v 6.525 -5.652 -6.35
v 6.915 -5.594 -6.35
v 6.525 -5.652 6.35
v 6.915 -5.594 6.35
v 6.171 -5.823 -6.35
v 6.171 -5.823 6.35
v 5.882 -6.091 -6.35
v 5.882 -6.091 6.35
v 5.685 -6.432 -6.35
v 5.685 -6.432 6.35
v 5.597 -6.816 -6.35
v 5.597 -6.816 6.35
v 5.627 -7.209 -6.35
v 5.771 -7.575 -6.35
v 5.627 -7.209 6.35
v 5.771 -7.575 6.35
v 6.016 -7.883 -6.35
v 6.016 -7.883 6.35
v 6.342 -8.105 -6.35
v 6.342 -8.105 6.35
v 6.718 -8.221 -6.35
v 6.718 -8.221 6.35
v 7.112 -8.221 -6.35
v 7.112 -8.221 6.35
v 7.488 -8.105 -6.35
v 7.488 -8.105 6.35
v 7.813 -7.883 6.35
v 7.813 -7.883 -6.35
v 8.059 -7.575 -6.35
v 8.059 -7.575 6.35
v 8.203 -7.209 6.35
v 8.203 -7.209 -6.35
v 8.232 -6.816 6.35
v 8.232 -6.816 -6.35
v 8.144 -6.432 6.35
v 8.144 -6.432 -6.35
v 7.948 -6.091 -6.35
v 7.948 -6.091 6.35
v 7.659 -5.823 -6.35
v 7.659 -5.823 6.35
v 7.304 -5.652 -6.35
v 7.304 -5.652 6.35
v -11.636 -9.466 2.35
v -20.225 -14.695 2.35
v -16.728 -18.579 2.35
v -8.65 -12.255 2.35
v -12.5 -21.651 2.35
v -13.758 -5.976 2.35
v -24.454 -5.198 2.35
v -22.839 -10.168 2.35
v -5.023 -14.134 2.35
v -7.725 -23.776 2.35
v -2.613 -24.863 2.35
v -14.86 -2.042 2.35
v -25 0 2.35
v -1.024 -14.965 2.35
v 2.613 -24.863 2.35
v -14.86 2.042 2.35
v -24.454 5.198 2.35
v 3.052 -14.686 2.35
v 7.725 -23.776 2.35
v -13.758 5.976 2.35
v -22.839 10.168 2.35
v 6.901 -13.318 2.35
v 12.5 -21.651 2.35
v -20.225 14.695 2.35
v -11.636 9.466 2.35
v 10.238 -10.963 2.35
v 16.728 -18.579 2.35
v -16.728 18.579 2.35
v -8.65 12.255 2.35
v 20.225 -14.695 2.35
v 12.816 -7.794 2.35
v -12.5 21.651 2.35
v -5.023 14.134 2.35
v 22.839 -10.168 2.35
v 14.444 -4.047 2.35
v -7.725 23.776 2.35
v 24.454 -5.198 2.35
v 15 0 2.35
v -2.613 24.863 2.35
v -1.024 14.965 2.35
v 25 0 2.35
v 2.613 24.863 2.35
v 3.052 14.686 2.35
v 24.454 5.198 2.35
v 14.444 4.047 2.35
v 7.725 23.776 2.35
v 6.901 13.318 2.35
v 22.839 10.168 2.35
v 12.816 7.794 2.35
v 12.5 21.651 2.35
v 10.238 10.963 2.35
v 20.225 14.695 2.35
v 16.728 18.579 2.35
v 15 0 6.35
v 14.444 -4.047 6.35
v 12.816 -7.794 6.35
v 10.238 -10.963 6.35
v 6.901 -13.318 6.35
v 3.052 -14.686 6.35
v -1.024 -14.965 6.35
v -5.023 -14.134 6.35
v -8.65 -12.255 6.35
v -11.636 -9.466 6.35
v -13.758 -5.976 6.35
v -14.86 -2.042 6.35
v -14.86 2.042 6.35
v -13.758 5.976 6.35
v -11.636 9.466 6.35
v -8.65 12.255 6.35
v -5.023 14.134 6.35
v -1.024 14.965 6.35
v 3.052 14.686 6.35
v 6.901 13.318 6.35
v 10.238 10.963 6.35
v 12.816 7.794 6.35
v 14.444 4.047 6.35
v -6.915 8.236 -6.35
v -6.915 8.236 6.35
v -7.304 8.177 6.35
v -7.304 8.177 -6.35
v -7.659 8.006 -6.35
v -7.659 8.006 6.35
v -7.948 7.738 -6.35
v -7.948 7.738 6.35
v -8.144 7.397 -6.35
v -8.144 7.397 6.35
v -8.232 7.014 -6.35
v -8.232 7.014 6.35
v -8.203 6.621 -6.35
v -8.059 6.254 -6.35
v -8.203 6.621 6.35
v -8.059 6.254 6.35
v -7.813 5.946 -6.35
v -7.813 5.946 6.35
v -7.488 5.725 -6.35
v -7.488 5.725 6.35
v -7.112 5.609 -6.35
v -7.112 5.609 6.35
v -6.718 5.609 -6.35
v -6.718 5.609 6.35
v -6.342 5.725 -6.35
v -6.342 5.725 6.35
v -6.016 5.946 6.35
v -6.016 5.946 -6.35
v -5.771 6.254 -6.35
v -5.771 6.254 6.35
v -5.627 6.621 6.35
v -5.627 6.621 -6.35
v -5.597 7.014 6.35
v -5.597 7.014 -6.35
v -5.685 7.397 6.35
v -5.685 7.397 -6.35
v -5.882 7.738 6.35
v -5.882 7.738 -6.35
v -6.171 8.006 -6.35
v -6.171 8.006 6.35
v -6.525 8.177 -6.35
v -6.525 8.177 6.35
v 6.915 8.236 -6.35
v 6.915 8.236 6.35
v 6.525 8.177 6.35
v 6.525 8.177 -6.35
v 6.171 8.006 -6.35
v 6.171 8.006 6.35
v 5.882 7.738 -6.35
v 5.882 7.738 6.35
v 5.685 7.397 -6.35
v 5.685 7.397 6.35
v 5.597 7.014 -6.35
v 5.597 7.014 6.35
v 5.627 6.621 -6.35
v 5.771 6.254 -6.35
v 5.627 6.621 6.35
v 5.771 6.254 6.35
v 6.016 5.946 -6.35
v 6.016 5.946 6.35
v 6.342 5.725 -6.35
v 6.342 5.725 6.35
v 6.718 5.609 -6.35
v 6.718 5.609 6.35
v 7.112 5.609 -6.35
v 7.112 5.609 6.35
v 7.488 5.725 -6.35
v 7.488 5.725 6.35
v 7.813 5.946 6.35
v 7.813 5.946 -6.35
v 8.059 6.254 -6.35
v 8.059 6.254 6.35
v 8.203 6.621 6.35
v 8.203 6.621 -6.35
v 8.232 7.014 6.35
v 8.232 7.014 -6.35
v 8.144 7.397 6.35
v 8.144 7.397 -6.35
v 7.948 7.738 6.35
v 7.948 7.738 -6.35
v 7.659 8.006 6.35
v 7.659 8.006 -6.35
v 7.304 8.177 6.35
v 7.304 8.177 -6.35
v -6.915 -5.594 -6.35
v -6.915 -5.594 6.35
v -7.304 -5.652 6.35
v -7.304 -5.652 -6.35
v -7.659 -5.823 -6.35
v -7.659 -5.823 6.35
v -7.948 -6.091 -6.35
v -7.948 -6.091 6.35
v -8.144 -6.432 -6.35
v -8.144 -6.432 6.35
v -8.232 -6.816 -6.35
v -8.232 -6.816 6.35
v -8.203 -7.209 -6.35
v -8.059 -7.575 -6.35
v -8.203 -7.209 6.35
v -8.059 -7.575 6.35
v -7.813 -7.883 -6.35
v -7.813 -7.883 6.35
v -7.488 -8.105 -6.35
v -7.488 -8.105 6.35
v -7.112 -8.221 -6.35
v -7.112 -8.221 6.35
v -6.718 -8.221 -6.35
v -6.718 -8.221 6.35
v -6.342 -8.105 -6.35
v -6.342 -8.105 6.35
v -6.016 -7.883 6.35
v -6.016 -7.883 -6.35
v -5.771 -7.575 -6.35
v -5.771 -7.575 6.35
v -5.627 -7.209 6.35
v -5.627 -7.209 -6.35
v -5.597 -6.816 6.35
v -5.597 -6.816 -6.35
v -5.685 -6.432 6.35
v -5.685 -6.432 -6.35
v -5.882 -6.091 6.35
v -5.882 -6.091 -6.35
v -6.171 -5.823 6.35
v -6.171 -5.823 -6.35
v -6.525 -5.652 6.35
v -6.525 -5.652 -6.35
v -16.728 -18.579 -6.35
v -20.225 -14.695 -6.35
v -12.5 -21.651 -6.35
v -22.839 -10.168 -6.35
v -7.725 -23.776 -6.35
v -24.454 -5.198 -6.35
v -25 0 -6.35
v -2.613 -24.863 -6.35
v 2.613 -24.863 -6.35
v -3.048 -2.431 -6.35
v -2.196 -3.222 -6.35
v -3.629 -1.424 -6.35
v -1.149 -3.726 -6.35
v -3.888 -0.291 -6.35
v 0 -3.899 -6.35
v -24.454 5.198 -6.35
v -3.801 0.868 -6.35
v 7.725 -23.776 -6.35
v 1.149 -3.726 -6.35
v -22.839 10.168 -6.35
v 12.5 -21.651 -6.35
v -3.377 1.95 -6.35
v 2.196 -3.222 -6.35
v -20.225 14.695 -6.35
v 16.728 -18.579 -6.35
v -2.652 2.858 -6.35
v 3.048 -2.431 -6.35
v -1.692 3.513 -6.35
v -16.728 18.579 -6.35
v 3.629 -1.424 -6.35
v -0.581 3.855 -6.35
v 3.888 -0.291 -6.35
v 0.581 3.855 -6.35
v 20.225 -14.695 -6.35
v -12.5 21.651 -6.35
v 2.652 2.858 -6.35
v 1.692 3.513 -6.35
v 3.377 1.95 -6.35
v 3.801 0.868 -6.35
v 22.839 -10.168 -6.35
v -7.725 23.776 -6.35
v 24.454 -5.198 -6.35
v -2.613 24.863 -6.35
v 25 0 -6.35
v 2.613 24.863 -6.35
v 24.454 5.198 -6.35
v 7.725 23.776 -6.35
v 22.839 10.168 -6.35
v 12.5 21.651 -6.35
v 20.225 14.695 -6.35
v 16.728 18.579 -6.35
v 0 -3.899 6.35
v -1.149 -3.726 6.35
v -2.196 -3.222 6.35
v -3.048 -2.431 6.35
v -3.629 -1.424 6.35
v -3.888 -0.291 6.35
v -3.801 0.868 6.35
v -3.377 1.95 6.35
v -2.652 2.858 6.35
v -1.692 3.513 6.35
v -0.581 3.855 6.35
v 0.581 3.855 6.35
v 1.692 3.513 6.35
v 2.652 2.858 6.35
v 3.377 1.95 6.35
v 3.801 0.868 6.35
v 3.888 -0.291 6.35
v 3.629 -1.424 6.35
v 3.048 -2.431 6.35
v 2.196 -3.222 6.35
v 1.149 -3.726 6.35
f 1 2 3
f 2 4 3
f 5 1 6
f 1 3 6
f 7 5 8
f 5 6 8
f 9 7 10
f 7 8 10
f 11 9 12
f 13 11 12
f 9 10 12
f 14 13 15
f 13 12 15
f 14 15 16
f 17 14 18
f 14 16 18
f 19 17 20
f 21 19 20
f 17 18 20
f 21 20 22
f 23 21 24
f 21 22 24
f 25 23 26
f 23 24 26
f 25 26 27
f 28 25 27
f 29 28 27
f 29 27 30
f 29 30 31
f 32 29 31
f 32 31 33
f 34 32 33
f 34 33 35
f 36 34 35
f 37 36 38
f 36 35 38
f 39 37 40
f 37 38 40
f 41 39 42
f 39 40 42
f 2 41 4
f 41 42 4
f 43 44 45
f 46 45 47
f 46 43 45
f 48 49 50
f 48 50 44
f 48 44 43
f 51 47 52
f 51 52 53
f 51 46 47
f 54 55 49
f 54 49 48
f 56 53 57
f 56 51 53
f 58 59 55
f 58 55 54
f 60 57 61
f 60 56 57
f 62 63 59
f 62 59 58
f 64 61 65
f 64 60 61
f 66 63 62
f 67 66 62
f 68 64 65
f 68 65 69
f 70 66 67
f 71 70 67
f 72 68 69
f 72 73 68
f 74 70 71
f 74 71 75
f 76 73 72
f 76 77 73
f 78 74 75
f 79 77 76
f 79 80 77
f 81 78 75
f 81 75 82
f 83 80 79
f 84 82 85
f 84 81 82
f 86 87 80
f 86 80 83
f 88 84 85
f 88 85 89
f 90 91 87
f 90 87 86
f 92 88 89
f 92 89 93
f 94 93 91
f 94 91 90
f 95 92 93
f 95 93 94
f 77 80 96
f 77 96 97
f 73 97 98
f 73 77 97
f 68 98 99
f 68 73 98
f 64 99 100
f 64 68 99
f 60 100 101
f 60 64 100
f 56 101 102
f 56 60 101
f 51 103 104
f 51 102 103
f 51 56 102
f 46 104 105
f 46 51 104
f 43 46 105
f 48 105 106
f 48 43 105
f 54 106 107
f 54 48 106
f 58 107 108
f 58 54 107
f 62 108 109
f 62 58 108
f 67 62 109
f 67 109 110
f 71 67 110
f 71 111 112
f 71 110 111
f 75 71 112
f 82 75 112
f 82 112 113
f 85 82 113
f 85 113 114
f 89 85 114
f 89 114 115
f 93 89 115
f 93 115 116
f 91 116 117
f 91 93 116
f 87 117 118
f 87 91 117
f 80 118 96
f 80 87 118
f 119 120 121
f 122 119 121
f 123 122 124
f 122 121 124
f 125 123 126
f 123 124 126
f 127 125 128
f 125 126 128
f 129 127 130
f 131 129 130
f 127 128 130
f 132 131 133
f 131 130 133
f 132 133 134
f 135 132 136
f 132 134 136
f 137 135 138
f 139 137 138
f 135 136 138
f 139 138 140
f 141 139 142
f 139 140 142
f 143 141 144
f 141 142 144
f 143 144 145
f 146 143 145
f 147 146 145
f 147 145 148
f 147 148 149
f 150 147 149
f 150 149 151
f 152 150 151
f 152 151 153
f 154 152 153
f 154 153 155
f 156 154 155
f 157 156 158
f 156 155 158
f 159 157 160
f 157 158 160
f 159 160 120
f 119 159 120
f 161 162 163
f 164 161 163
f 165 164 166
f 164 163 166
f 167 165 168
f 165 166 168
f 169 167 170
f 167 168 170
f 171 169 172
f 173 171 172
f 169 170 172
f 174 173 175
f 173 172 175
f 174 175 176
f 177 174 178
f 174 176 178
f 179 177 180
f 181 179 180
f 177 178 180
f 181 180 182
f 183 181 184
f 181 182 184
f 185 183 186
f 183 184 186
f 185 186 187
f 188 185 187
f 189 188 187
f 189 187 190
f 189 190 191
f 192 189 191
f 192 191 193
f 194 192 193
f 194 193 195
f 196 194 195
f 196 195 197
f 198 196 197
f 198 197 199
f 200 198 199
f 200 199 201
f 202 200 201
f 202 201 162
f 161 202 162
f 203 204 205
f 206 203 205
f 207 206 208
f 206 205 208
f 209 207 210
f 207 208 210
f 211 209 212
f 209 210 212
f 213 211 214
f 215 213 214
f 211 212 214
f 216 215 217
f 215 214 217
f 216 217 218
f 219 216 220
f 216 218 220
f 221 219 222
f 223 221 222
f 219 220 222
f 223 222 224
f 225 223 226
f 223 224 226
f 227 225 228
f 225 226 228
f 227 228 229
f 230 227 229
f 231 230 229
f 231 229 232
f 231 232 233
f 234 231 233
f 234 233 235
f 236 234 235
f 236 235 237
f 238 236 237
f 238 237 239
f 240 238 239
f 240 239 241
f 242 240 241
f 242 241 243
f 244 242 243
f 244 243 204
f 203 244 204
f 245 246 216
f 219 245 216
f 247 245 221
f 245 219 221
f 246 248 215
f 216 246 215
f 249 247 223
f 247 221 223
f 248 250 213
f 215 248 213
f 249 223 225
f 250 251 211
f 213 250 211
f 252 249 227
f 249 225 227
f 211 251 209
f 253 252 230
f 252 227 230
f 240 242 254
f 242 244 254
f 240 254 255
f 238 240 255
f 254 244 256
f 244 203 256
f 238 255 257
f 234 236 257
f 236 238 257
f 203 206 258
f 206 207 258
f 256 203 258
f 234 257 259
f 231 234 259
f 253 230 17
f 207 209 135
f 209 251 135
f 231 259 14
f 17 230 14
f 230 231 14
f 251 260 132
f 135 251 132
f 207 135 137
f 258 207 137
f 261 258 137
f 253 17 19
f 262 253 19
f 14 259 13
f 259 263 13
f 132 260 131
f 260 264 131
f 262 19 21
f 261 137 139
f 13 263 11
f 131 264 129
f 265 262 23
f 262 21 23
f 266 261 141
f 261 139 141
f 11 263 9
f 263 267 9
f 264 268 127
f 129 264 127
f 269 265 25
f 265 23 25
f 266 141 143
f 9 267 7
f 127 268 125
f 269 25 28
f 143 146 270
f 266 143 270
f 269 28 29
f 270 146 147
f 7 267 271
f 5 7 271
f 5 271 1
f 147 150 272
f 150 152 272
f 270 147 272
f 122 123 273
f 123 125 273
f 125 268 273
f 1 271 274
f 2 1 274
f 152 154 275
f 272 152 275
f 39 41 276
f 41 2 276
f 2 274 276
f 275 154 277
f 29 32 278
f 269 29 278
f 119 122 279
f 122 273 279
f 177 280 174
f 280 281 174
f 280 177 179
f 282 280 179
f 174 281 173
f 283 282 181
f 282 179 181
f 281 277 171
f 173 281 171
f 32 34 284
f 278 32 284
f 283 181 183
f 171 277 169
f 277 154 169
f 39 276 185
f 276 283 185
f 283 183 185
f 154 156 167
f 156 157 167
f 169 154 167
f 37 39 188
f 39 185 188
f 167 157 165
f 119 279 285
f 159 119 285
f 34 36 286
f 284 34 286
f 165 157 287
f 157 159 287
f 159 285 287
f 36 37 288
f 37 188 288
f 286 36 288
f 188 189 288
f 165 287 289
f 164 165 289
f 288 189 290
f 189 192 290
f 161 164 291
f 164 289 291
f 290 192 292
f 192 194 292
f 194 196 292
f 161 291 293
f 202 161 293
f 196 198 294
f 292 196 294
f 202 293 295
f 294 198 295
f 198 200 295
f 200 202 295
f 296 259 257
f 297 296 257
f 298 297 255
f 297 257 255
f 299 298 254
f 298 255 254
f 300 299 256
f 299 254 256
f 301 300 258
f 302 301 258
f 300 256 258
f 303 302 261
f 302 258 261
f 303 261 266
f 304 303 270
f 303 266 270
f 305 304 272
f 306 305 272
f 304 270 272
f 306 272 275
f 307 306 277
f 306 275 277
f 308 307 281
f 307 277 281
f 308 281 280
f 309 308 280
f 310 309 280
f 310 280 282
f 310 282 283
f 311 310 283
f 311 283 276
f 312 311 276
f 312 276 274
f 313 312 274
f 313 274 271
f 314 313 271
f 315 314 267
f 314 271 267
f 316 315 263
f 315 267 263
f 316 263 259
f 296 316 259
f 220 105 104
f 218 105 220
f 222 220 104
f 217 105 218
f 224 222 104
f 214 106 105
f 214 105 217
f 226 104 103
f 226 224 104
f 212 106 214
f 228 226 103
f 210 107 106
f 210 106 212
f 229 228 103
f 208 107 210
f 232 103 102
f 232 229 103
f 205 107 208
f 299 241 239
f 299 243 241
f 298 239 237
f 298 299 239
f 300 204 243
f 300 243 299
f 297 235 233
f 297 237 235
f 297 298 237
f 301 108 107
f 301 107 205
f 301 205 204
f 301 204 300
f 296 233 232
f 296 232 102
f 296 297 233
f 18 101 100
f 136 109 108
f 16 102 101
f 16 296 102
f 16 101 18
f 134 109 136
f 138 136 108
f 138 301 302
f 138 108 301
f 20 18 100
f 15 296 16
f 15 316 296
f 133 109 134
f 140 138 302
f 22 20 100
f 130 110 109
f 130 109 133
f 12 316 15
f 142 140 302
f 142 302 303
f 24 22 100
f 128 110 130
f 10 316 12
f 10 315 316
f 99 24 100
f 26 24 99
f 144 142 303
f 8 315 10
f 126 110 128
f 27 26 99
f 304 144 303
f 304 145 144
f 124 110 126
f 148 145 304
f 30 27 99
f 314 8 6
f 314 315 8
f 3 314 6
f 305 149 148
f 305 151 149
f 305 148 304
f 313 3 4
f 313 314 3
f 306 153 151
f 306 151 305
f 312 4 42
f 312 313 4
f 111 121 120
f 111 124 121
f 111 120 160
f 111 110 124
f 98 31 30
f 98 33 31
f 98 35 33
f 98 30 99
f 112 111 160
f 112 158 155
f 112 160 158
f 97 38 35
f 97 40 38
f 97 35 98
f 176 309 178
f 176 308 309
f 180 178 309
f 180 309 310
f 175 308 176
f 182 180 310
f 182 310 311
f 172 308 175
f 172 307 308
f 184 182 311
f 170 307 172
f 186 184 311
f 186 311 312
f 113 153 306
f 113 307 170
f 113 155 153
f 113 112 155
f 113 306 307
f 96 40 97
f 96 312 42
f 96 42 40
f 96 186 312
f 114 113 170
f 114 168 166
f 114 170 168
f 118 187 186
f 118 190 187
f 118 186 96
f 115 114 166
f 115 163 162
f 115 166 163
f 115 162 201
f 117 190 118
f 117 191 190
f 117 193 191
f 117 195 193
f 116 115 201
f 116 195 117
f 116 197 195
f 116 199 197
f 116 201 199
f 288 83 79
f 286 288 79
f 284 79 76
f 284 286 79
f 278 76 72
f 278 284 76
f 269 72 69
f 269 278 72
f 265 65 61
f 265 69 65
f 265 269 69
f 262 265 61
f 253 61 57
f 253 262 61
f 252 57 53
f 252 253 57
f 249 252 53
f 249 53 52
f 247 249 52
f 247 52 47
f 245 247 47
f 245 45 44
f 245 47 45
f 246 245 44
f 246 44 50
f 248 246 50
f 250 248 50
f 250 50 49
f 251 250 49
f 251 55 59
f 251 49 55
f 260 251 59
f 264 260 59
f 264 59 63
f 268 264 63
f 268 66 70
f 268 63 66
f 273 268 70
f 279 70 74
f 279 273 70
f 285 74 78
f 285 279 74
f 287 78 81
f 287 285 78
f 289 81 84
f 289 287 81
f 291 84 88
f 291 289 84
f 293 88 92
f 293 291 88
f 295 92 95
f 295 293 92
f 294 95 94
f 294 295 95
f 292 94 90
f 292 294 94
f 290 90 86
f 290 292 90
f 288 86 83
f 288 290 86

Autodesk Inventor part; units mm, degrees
ref_plane "YZ Plane" through (0, 0, 0) normal (1, 0, 0) x (0, 1, 0)
ref_plane "XZ Plane" through (0, 0, 0) normal (0, 1, 0) x (-1, 0, 0)
ref_plane "XY Plane" through (0, 0, 0) normal (0, 0, 1) x (1, 0, 0)
sketch "Sketch1" plane through (0, 0, 0) normal (0, 1, 0) x (-1, 0, 0)
  line L0 (0, 6.35) -> (-15, 6.35)
  line L1 (-15, 6.35) -> (-15, 2.35)
  line L2 (-15, 2.35) -> (-25, 2.35)
  line L3 (-25, 2.35) -> (-25, -6.35)
  line L4 (-25, -6.35) -> (0, -6.35)
  line L5 (0, -6.35) -> (0, 6.35)
  point P0 (0, 0)
  point P1 (0, 0)
  dimension "d0" = 30
  dimension "d1" = 10
  dimension "d2" = 12.7
  dimension "d3" = 4
revolve "Revolution1" add sketch "Sketch1" angle 360 about axis through (0, 0, -6.35) along (0, 0, 1)
hole "Hole1" at (0, 0, 6.35) direction (0, 0, -1) diameter 7.798 end through all thread size "3/8-16 UNC" class "2B" standard "ANSI Unified Screw Threads"
sketch "Sketch3" plane through (0, 0, -6.35) normal (0, 0, -1) x (-1, 0, 0)
  line L0 (-6.9148, 6.9148) -> (6.9148, 6.9148)
  line L1 (6.9148, 6.9148) -> (6.9148, -6.9148)
  line L2 (6.9148, -6.9148) -> (-6.9148, -6.9148)
  line L3 (-6.9148, -6.9148) -> (-6.9148, 6.9148)
  line L4 (-6.9148, 6.9148) -> (6.9148, -6.9148) construction
  line L5 (6.9148, 6.9148) -> (-6.9148, -6.9148) construction
  point P0 (0, 0)
  dimension "d14" = 19.558
hole "Hole2" at (-6.9148, 6.9148, -6.35) at (-6.9148, -6.9148, -6.35) at (6.9148, -6.9148, -6.35) at (6.9148, 6.9148, -6.35) direction (0, 0, 1) diameter 2.642 end through all thread size "6-32 UNC" class "2B" standard "ANSI Unified Screw Threads"
properties part number "Ground_Tracker_TripodMount" material "UHMW, White"
